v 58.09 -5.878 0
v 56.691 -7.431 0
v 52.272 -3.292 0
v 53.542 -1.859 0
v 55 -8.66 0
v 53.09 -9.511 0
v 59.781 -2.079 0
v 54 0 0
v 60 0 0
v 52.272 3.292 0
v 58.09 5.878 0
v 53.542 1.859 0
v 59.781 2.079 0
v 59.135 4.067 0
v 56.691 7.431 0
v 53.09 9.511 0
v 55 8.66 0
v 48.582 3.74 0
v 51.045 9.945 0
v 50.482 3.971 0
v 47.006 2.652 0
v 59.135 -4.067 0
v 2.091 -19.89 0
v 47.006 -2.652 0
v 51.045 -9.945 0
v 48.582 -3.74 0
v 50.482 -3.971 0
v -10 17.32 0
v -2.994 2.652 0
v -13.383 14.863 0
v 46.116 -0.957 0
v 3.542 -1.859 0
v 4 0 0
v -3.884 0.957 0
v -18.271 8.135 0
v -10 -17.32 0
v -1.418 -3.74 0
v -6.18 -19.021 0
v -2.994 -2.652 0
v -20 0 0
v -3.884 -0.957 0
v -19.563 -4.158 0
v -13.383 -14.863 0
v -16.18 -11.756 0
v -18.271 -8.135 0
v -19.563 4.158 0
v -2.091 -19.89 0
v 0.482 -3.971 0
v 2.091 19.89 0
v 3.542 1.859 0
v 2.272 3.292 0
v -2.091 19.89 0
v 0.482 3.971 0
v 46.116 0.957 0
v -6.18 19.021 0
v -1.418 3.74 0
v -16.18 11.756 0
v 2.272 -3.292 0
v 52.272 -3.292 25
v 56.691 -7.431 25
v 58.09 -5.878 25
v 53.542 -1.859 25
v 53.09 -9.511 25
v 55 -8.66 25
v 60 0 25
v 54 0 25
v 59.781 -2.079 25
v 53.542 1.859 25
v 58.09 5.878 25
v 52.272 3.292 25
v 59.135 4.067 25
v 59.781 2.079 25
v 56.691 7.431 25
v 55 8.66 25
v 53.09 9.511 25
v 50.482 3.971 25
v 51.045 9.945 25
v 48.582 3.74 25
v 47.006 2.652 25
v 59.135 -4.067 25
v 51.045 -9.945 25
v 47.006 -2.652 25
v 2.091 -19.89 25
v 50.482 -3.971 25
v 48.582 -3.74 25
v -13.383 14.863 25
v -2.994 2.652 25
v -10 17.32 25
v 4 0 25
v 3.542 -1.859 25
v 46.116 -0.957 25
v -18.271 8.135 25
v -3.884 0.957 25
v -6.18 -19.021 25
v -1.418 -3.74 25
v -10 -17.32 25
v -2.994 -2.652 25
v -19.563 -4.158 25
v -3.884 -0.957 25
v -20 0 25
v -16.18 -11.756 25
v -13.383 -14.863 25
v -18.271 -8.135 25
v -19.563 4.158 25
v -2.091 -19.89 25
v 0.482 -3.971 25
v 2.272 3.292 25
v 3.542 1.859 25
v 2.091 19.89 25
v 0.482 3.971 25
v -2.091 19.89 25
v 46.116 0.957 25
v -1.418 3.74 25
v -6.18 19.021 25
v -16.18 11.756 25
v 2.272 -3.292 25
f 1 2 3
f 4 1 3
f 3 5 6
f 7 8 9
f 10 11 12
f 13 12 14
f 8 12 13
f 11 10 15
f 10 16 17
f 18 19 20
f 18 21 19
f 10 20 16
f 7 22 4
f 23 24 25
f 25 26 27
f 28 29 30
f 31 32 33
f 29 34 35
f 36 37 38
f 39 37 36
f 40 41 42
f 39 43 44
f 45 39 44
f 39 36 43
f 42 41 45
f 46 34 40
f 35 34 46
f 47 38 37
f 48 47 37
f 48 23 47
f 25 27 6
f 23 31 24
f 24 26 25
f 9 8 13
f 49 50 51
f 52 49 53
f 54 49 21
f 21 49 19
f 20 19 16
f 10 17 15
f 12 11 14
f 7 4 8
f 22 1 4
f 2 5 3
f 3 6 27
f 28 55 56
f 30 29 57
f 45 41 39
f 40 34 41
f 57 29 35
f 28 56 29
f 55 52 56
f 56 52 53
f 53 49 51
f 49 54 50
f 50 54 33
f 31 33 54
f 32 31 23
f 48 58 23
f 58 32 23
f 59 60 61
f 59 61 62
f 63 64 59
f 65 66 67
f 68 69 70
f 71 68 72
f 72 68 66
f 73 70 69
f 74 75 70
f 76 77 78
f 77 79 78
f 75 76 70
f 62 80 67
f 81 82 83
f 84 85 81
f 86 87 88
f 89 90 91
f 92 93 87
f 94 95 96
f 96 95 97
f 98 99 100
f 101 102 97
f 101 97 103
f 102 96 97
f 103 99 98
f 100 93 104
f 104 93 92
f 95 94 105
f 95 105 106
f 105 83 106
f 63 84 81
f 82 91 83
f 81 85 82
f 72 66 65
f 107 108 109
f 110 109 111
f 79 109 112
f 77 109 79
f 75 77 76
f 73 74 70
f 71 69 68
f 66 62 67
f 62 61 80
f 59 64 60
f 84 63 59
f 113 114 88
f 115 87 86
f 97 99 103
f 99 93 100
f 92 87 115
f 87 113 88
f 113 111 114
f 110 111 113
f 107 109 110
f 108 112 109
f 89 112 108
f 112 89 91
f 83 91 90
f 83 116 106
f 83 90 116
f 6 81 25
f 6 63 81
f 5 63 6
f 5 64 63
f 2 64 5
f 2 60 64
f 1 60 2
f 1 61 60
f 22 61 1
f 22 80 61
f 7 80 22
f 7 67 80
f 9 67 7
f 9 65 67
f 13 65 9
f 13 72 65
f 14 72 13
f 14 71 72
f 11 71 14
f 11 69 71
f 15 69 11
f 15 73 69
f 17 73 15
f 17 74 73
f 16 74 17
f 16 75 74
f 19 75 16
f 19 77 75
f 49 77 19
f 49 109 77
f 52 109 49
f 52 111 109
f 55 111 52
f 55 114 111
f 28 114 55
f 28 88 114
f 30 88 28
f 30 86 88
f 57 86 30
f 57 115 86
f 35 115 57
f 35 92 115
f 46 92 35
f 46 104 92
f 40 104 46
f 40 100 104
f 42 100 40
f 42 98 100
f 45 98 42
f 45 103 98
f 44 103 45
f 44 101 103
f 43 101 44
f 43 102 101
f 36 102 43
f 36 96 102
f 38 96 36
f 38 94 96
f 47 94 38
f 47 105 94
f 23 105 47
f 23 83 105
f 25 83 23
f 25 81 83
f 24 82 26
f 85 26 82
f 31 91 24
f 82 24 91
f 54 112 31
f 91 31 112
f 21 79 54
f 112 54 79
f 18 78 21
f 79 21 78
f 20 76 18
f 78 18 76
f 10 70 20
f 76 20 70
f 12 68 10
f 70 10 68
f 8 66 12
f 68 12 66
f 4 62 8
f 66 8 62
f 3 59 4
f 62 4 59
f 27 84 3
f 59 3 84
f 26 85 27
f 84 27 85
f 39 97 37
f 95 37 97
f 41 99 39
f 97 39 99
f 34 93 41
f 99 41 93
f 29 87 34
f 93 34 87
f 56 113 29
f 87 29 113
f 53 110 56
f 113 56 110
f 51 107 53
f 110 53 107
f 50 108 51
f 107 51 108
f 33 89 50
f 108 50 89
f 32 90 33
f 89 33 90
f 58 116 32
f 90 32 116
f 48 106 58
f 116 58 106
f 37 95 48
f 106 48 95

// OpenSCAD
linear_extrude(height=25){
	
	difference(){
	
		hull(){
			
			circle(r=20);
			
			translate([50,0])
					circle(r=10);
		
		}
	
	
		translate([50,0])
				circle(r=4);
		
	
		circle(r=4);
	
	
	}

}
